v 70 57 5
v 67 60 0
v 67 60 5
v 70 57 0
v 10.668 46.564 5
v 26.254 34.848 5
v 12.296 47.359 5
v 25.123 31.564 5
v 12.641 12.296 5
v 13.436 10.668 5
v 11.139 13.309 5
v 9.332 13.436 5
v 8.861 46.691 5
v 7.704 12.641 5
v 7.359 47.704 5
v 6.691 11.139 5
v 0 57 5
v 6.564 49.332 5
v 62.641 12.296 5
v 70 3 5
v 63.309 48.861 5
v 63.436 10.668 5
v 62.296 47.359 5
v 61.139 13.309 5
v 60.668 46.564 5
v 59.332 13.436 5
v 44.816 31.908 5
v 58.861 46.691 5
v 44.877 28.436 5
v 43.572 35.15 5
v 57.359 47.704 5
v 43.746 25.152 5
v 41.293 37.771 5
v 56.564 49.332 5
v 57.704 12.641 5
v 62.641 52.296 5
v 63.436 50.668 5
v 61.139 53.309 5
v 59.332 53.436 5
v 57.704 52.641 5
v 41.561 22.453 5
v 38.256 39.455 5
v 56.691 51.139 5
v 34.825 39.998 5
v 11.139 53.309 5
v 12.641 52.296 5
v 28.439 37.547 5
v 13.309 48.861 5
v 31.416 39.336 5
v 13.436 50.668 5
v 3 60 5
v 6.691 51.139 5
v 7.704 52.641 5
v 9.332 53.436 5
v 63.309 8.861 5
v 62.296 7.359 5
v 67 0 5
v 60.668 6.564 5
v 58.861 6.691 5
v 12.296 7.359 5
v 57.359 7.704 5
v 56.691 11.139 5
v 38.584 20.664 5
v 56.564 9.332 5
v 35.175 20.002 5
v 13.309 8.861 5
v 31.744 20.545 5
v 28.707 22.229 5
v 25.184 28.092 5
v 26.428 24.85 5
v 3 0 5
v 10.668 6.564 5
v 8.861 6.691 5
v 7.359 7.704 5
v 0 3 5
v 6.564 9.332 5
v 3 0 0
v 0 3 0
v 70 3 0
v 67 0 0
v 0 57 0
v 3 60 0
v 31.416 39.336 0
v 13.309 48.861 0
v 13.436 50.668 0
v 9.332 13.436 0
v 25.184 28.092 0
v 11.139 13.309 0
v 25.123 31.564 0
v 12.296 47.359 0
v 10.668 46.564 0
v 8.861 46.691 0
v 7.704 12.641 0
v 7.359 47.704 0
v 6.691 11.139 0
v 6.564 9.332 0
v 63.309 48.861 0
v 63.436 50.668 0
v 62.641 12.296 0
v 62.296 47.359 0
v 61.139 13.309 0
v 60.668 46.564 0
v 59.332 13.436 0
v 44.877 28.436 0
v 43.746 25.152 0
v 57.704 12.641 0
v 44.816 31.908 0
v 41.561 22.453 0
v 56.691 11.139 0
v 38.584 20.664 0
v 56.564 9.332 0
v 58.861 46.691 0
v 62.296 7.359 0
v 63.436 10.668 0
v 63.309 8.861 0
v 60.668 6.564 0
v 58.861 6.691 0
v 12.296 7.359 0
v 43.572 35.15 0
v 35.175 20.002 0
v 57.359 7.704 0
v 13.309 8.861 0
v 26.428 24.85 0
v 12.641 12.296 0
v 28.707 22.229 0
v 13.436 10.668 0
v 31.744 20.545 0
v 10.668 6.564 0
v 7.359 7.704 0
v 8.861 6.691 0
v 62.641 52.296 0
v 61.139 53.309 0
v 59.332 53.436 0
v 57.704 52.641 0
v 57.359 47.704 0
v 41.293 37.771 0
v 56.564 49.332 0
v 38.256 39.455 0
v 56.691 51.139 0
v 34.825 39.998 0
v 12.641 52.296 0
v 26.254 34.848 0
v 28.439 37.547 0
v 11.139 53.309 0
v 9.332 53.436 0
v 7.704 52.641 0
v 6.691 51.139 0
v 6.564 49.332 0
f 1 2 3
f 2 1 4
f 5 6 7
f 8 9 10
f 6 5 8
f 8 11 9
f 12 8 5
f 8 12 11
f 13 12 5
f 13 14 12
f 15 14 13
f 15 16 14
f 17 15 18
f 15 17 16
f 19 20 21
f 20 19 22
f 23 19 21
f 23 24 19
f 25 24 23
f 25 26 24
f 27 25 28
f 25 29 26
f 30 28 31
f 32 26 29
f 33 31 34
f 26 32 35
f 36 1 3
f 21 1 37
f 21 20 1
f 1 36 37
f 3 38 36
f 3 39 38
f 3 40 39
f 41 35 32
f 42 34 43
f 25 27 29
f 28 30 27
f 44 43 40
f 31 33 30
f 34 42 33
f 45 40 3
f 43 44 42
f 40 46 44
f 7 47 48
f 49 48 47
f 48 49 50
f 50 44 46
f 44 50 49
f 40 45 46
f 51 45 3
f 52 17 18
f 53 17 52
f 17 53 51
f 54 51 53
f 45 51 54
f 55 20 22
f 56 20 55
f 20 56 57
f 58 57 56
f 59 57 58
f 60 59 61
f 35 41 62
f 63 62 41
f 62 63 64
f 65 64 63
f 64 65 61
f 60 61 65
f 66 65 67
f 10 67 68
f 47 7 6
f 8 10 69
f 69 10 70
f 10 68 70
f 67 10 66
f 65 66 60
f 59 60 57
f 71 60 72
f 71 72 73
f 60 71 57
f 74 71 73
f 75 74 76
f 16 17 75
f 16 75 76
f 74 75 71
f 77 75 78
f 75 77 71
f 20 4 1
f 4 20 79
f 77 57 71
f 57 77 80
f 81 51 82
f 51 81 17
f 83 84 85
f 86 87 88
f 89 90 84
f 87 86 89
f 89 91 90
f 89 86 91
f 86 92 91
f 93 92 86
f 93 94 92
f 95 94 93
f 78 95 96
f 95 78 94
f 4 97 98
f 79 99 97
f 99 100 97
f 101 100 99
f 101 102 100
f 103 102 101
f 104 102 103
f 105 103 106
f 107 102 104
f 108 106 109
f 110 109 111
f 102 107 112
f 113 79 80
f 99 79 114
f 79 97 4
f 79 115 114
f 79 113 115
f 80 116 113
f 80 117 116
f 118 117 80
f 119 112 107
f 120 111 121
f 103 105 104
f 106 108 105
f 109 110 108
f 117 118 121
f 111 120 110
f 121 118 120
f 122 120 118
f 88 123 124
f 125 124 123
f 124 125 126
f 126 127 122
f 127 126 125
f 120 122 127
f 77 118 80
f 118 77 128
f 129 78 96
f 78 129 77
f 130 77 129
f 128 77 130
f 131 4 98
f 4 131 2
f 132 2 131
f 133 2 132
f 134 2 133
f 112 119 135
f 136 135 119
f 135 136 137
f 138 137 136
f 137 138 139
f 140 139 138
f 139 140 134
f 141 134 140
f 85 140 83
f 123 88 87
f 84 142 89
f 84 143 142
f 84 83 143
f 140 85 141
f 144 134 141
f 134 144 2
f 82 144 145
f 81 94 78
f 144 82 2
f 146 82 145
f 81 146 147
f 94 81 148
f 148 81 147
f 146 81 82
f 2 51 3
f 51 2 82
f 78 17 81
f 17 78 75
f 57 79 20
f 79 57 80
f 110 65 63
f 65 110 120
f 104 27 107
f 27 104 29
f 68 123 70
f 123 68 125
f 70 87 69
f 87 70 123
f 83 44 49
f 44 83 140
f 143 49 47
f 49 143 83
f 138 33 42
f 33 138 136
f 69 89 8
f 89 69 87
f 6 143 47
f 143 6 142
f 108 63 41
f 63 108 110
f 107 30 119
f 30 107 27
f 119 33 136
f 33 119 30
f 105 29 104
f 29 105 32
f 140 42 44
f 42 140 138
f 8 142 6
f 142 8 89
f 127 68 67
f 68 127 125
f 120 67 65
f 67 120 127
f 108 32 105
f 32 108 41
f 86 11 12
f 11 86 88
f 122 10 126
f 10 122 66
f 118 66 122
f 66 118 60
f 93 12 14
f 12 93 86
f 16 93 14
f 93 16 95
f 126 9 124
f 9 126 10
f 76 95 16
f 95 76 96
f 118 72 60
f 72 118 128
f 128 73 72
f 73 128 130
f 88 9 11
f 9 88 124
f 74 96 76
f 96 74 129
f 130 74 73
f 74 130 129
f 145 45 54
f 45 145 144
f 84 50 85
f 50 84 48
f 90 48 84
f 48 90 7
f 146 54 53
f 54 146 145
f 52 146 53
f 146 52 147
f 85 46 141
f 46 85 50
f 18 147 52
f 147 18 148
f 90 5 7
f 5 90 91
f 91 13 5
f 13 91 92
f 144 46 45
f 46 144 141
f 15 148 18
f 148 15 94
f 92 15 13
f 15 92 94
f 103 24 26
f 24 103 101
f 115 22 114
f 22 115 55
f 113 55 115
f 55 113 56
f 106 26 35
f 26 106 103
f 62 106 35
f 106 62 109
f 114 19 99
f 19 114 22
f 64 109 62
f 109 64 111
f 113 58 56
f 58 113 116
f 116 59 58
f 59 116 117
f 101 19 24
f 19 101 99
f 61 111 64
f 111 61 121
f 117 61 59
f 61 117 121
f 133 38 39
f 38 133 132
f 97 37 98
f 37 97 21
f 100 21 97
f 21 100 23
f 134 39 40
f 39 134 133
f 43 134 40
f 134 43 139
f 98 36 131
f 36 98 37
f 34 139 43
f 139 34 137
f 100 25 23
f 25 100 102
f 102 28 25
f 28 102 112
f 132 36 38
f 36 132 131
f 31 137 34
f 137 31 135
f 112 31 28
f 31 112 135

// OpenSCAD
$fn = 32;

// ----------------------------------------------------------------------
// Spacer plate: rect 70 x 60
// ----------------------------------------------------------------------

// --- parameters (mm) ---
bore_r = 10;              // centre bore radius
bolt_r = 3.5;             // bolt hole radius
plate_t = 5;              // plate thickness, Z (extrusion height)
plate_l = 70;             // plate length, X
plate_w = 60;             // plate width, Y
inset = 10;               // corner hole inset

profile = [[3, 0], [67, 0], [70, 3], [70, 57], [67, 60], [3, 60], [0, 57], [0, 3]];  // primary outline, 8 points, counter clockwise
void_1 = [[44.816, 31.908], [43.572, 35.15], [41.293, 37.771], [38.256, 39.455], [34.825, 39.998], [31.416, 39.336], [28.439, 37.547], [26.254, 34.848], [25.123, 31.564], [25.184, 28.092], [26.428, 24.85], [28.707, 22.229], [31.744, 20.545], [35.175, 20.002], [38.584, 20.664], [41.561, 22.453], [43.746, 25.152], [44.877, 28.436]];  // centre bore, 18 points
void_2 = [[13.436, 10.668], [12.641, 12.296], [11.139, 13.309], [9.332, 13.436], [7.704, 12.641], [6.691, 11.139], [6.564, 9.332], [7.359, 7.704], [8.861, 6.691], [10.668, 6.564], [12.296, 7.359], [13.309, 8.861]];  // corner hole, 12 points
void_3 = [[13.436, 50.668], [12.641, 52.296], [11.139, 53.309], [9.332, 53.436], [7.704, 52.641], [6.691, 51.139], [6.564, 49.332], [7.359, 47.704], [8.861, 46.691], [10.668, 46.564], [12.296, 47.359], [13.309, 48.861]];  // corner hole, 12 points
void_4 = [[63.436, 10.668], [62.641, 12.296], [61.139, 13.309], [59.332, 13.436], [57.704, 12.641], [56.691, 11.139], [56.564, 9.332], [57.359, 7.704], [58.861, 6.691], [60.668, 6.564], [62.296, 7.359], [63.309, 8.861]];  // corner hole, 12 points
void_5 = [[63.436, 50.668], [62.641, 52.296], [61.139, 53.309], [59.332, 53.436], [57.704, 52.641], [56.691, 51.139], [56.564, 49.332], [57.359, 47.704], [58.861, 46.691], [60.668, 46.564], [62.296, 47.359], [63.309, 48.861]];  // corner hole, 12 points

// --- the one profile operation ---
difference() {
  linear_extrude(height = plate_t) polygon(points = profile);
  translate([0, 0, -1])
    linear_extrude(height = plate_t + 2) polygon(points = void_1);
  translate([0, 0, -1])
    linear_extrude(height = plate_t + 2) polygon(points = void_2);
  translate([0, 0, -1])
    linear_extrude(height = plate_t + 2) polygon(points = void_3);
  translate([0, 0, -1])
    linear_extrude(height = plate_t + 2) polygon(points = void_4);
  translate([0, 0, -1])
    linear_extrude(height = plate_t + 2) polygon(points = void_5);
}
